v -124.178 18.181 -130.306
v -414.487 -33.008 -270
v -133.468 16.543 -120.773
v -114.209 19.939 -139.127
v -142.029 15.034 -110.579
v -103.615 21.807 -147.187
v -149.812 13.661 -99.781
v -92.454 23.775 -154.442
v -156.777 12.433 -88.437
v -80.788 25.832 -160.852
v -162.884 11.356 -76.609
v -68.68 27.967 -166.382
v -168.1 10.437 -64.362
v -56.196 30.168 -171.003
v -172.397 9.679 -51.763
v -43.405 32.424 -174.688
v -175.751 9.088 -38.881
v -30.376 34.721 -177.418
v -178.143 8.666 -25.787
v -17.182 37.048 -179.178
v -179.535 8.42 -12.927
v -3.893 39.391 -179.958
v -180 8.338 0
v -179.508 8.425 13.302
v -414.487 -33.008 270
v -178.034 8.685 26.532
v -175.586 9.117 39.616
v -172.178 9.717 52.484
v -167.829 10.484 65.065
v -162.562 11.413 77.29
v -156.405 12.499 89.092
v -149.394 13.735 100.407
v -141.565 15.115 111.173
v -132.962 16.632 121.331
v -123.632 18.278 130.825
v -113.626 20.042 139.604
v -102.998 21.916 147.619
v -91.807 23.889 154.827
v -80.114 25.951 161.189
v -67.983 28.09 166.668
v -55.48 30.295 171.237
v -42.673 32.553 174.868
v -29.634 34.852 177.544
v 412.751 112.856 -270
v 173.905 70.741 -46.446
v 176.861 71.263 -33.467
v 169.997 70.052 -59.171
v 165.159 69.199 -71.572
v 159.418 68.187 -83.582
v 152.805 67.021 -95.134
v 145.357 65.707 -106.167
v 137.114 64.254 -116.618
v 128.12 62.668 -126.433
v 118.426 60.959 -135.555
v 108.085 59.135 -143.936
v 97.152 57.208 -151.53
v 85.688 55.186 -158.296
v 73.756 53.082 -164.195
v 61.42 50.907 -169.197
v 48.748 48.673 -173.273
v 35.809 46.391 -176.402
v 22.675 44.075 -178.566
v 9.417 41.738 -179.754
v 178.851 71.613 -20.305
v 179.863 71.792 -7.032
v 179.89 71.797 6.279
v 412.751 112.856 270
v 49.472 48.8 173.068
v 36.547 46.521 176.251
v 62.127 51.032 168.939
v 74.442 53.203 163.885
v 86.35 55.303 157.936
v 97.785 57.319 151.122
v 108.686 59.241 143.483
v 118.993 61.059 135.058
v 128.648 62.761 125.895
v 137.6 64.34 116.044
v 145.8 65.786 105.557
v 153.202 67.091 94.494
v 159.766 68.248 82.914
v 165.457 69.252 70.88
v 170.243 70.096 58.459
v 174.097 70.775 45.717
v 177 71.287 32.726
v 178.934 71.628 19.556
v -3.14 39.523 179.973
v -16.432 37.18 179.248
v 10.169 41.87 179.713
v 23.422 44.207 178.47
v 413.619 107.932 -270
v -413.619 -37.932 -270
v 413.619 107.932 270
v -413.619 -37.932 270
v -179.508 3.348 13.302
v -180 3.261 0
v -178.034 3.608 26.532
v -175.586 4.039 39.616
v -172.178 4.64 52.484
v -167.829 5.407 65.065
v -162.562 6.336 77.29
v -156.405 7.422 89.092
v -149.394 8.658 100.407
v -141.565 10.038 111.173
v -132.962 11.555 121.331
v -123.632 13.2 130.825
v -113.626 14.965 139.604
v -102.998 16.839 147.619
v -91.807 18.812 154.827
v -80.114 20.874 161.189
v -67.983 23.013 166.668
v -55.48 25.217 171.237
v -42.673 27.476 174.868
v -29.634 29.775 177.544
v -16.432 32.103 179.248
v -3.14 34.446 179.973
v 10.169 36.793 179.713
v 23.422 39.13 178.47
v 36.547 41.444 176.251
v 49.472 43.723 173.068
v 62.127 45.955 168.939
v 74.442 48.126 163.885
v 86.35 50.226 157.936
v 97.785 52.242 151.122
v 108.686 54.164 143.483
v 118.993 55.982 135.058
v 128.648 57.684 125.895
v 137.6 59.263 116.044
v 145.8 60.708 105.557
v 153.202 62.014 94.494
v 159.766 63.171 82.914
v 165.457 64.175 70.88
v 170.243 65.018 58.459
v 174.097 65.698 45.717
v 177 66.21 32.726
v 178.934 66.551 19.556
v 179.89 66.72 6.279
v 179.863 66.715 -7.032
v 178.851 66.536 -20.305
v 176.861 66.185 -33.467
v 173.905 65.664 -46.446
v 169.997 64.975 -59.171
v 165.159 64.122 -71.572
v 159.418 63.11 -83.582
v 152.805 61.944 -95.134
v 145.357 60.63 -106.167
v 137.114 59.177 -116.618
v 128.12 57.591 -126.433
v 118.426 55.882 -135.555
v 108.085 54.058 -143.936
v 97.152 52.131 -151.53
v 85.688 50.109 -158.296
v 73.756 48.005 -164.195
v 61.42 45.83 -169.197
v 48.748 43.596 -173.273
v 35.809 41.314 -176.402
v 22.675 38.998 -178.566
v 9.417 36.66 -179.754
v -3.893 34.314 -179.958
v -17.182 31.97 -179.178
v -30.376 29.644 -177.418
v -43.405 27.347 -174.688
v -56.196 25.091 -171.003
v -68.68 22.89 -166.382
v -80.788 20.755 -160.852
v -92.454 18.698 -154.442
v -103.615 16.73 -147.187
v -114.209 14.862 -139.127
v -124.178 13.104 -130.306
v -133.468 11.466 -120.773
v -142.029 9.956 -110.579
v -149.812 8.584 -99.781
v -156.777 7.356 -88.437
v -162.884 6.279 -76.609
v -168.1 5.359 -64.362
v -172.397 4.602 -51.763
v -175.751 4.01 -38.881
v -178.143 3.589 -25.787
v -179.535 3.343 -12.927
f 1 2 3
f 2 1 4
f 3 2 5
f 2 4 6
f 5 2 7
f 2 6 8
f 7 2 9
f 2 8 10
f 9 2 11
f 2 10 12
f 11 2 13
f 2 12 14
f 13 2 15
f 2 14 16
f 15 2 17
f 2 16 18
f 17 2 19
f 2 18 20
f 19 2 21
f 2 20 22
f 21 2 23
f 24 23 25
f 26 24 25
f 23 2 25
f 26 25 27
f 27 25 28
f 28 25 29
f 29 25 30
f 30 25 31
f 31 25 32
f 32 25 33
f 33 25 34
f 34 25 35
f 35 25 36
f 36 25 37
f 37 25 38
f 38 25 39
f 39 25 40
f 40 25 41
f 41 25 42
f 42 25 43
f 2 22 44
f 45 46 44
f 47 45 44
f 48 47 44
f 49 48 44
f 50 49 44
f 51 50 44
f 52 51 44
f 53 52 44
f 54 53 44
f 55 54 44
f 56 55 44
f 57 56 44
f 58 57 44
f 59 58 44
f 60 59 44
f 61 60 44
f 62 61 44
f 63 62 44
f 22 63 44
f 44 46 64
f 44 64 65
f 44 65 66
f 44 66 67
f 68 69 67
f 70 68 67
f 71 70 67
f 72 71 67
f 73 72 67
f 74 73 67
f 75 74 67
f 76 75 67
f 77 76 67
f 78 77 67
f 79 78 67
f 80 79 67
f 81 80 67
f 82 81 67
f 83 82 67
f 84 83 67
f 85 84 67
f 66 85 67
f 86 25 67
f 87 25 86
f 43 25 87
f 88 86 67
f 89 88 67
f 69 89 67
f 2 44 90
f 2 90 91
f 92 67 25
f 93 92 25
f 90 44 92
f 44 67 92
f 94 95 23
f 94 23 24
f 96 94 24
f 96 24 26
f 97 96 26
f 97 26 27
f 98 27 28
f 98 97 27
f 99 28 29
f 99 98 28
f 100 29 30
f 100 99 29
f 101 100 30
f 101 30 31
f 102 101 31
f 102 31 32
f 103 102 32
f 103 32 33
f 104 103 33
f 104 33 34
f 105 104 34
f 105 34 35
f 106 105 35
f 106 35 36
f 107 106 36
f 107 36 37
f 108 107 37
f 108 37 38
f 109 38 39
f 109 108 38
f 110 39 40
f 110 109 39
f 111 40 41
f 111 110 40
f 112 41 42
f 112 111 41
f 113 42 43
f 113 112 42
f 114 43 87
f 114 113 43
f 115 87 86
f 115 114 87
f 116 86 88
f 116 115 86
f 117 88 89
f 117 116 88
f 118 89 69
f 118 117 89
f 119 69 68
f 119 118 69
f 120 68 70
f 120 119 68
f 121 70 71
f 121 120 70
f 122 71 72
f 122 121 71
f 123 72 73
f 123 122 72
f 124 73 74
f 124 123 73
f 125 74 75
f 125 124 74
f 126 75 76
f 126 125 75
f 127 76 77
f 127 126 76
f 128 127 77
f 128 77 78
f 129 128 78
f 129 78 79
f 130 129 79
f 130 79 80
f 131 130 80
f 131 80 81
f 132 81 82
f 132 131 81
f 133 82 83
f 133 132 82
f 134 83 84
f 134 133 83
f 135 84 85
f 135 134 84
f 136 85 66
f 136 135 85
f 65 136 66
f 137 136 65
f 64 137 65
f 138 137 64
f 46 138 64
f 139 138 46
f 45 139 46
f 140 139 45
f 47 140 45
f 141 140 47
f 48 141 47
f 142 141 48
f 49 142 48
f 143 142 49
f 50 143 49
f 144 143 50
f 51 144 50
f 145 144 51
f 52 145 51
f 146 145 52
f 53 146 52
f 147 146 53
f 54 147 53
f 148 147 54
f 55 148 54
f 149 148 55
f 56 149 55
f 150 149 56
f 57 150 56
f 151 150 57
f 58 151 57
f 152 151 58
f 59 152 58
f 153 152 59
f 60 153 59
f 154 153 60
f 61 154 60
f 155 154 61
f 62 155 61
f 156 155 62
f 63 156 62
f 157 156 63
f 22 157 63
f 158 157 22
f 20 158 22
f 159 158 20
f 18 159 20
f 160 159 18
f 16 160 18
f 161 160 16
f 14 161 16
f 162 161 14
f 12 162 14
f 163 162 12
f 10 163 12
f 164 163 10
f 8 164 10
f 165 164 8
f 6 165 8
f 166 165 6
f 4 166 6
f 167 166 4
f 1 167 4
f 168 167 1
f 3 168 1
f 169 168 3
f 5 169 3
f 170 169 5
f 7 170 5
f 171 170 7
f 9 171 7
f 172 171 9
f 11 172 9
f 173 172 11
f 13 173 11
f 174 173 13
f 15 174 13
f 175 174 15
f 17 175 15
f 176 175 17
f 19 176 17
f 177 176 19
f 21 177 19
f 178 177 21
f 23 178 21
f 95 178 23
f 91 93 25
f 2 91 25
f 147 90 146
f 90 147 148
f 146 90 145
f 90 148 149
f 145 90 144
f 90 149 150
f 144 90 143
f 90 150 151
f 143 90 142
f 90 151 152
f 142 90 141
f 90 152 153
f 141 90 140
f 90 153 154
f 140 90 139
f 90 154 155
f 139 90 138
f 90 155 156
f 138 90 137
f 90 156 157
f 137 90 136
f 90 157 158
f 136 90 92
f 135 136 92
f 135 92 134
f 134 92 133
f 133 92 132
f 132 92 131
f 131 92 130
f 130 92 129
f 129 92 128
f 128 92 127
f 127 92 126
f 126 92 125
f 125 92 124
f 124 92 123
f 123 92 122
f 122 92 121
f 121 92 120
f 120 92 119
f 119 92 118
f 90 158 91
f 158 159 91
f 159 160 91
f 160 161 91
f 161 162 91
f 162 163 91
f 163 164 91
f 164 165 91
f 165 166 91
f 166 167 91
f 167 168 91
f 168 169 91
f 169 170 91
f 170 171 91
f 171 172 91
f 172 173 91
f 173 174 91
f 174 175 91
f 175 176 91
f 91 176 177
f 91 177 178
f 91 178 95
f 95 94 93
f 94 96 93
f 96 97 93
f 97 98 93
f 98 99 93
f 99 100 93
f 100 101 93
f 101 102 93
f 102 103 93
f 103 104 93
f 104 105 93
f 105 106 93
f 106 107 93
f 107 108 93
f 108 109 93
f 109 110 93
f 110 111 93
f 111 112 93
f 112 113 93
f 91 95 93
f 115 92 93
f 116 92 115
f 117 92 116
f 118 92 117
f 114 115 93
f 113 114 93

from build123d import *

# Parameters (mm, degrees)
BOSS_EXTRUDE1_DEPTH = 270
CUT_EXTRUDE1_REACH  = 509.382
SKETCH2_R           = 180


with BuildPart() as part:
    # Sketch1 → Boss-Extrude1 (new, symmetric)
    with BuildSketch(Plane.XY):
        Polygon((-414.487497153, -33.008195855), (412.751015377, 112.856273385), (413.619256265, 107.93223462), (-413.619256265, -37.93223462), align=None)
    extrude(amount=BOSS_EXTRUDE1_DEPTH, both=True)

    # Cut-Extrude1: up to this face of the body (flat: up to its plane)
    cut_extrude1_end = Plane(part.part.faces().sort_by_distance((-0.868240888, 39.924038765, 0))[0])
    # Sketch2 → Cut-Extrude1 (cut, up to the picked face)
    with BuildSketch(Plane(origin=(0, 0, 0), x_dir=(1, 0, 0), z_dir=(0, 1, 0)), mode=Mode.PRIVATE) as cut_extrude1_sk1:
        with Locations(Location((0, 0, 0), (0, 0, 180))):
            Circle(SKETCH2_R)
    cut_extrude1_tool1 = split(extrude(cut_extrude1_sk1.sketch, amount=CUT_EXTRUDE1_REACH, mode=Mode.PRIVATE), bisect_by=cut_extrude1_end, keep=Keep.BOTH, mode=Mode.PRIVATE)
    add(cut_extrude1_tool1.solids().sort_by(Axis((0, 0, 0), (0, 1, 0)))[0], mode=Mode.SUBTRACT)


solid = part.part
